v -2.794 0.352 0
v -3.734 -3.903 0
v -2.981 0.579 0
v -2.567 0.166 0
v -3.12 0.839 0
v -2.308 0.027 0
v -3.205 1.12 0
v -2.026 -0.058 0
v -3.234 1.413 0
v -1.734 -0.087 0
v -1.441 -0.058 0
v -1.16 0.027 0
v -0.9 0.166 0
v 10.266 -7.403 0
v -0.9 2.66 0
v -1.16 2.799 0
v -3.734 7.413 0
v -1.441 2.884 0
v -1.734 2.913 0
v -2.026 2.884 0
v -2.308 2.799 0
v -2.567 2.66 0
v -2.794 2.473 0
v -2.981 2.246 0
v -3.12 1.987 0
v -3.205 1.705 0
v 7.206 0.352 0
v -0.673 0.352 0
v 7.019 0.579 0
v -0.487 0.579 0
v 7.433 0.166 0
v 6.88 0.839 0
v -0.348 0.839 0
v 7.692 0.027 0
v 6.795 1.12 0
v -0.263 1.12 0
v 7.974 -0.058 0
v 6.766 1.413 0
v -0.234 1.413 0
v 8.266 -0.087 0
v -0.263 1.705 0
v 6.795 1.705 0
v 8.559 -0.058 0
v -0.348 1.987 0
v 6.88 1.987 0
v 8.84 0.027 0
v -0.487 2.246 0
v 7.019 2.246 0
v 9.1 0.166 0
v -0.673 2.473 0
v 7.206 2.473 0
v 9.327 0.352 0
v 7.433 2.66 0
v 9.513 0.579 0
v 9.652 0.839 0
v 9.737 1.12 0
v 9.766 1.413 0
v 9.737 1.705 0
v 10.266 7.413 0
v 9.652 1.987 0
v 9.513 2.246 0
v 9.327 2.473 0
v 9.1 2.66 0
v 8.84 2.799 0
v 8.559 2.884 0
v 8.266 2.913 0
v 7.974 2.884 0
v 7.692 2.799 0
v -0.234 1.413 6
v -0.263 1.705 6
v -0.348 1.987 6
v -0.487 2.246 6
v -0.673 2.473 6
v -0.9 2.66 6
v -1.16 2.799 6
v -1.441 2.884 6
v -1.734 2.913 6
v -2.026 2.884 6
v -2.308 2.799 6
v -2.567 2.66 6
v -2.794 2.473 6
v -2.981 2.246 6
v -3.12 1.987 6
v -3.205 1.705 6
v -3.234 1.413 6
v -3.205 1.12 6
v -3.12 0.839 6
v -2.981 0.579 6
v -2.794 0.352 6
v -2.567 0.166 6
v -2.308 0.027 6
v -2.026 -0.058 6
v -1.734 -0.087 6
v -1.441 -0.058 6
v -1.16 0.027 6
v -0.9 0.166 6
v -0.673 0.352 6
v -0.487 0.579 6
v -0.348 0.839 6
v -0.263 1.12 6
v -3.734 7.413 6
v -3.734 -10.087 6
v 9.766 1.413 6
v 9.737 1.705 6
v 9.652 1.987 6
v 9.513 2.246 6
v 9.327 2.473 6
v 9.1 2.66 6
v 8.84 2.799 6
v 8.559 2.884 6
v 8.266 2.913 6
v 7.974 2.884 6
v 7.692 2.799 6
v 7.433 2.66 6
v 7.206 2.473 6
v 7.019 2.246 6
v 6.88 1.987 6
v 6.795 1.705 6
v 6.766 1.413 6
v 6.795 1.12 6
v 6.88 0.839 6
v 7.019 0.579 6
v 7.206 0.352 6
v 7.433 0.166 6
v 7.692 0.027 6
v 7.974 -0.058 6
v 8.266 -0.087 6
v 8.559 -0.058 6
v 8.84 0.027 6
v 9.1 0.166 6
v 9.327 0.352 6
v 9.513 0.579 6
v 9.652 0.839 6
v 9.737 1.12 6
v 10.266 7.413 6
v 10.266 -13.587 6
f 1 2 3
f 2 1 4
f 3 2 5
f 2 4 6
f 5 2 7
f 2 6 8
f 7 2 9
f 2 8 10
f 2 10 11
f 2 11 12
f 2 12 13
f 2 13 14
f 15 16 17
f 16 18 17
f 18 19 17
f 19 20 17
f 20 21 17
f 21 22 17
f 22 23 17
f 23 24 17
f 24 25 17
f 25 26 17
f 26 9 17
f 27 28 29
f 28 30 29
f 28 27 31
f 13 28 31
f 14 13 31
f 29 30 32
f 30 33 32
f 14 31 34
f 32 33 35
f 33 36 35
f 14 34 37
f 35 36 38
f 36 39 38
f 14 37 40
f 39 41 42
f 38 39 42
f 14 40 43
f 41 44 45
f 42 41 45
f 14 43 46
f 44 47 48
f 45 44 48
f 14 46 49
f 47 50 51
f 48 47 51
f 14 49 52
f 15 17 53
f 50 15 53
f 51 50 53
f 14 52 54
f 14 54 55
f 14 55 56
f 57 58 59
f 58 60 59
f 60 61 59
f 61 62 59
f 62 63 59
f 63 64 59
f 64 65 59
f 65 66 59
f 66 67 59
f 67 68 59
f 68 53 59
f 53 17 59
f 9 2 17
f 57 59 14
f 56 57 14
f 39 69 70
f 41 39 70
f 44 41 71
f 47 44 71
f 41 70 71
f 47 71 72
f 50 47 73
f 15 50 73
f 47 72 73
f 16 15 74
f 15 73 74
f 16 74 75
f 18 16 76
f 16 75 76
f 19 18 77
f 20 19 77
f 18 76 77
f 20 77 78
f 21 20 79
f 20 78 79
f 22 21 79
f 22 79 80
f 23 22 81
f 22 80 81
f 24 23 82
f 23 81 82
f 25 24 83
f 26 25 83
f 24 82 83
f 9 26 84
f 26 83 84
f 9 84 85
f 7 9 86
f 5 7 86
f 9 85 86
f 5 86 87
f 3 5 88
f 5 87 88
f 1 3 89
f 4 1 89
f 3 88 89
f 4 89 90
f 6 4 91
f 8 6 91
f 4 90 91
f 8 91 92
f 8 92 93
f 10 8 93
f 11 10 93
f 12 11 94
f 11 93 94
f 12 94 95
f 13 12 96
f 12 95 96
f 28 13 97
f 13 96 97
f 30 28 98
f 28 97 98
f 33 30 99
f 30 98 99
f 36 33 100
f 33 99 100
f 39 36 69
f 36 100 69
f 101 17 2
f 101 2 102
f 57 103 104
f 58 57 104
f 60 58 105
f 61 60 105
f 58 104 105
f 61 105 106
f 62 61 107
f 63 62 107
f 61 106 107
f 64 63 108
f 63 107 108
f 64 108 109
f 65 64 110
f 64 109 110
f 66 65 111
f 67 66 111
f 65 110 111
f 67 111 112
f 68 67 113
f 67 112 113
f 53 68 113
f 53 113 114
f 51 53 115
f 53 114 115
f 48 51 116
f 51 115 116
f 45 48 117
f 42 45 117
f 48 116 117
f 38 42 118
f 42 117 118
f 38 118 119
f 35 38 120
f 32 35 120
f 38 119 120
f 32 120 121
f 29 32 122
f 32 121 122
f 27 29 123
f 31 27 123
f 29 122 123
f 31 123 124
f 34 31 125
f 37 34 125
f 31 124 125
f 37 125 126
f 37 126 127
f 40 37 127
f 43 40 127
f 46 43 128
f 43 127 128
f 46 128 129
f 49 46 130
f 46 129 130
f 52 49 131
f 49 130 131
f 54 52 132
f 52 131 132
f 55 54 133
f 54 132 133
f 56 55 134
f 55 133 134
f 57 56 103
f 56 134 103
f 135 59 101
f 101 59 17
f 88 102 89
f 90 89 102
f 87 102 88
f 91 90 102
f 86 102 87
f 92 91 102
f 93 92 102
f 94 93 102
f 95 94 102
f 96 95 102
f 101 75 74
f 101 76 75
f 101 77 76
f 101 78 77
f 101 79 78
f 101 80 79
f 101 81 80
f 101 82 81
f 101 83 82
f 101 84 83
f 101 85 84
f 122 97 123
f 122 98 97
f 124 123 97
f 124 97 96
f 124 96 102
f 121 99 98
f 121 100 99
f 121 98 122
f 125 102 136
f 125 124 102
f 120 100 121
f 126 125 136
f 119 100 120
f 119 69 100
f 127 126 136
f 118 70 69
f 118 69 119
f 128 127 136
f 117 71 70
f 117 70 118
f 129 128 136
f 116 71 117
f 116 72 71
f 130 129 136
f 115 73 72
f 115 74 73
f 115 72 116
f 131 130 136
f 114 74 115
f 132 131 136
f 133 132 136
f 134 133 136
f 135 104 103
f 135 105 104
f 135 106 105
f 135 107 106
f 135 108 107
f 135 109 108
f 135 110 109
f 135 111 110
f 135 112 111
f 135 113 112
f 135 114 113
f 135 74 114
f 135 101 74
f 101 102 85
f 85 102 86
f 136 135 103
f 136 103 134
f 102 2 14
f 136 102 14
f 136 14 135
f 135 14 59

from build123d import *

# Parameters (mm, degrees)
F1_DEPTH = 6
F2_SIZE  = 5.99999
F3_R     = 1.5
F4_DEPTH = 6


# Not quite as in the source:
# - a fillet or chamfer is up to 0.001 mm smaller than in the source, because OpenCascade refuses the exact size


with BuildPart() as f1:
    # F0 (on Top) → F1 (new body)
    with BuildSketch(Plane.XY):
        Polygon((10.2662842423, 7.4127185345), (-3.7337157577, 7.4127185345), (-3.7337157577, -10.0872814655), (10.2662842423, -13.5872814655), align=None)
    extrude(amount=F1_DEPTH)

    # F2 (size 6 in the source; OpenCascade refuses exactly that, so slightly less here)
    f2_edges = [f1.edges().sort_by_distance(p)[0] for p in [
        (3.266284, -11.837281, 0),
    ]]
    chamfer(f2_edges, length=F2_SIZE)

    # F3 (on face) → F4 (cut, through all)
    with BuildSketch(Plane.XY.offset(6)):
        with Locations((-1.7337157577, 1.4127185345)):
            Circle(F3_R)
        with Locations((8.2662842423, 1.4127185345)):
            Circle(F3_R)
    extrude(amount=-F4_DEPTH, mode=Mode.SUBTRACT)


solid = f1.part
